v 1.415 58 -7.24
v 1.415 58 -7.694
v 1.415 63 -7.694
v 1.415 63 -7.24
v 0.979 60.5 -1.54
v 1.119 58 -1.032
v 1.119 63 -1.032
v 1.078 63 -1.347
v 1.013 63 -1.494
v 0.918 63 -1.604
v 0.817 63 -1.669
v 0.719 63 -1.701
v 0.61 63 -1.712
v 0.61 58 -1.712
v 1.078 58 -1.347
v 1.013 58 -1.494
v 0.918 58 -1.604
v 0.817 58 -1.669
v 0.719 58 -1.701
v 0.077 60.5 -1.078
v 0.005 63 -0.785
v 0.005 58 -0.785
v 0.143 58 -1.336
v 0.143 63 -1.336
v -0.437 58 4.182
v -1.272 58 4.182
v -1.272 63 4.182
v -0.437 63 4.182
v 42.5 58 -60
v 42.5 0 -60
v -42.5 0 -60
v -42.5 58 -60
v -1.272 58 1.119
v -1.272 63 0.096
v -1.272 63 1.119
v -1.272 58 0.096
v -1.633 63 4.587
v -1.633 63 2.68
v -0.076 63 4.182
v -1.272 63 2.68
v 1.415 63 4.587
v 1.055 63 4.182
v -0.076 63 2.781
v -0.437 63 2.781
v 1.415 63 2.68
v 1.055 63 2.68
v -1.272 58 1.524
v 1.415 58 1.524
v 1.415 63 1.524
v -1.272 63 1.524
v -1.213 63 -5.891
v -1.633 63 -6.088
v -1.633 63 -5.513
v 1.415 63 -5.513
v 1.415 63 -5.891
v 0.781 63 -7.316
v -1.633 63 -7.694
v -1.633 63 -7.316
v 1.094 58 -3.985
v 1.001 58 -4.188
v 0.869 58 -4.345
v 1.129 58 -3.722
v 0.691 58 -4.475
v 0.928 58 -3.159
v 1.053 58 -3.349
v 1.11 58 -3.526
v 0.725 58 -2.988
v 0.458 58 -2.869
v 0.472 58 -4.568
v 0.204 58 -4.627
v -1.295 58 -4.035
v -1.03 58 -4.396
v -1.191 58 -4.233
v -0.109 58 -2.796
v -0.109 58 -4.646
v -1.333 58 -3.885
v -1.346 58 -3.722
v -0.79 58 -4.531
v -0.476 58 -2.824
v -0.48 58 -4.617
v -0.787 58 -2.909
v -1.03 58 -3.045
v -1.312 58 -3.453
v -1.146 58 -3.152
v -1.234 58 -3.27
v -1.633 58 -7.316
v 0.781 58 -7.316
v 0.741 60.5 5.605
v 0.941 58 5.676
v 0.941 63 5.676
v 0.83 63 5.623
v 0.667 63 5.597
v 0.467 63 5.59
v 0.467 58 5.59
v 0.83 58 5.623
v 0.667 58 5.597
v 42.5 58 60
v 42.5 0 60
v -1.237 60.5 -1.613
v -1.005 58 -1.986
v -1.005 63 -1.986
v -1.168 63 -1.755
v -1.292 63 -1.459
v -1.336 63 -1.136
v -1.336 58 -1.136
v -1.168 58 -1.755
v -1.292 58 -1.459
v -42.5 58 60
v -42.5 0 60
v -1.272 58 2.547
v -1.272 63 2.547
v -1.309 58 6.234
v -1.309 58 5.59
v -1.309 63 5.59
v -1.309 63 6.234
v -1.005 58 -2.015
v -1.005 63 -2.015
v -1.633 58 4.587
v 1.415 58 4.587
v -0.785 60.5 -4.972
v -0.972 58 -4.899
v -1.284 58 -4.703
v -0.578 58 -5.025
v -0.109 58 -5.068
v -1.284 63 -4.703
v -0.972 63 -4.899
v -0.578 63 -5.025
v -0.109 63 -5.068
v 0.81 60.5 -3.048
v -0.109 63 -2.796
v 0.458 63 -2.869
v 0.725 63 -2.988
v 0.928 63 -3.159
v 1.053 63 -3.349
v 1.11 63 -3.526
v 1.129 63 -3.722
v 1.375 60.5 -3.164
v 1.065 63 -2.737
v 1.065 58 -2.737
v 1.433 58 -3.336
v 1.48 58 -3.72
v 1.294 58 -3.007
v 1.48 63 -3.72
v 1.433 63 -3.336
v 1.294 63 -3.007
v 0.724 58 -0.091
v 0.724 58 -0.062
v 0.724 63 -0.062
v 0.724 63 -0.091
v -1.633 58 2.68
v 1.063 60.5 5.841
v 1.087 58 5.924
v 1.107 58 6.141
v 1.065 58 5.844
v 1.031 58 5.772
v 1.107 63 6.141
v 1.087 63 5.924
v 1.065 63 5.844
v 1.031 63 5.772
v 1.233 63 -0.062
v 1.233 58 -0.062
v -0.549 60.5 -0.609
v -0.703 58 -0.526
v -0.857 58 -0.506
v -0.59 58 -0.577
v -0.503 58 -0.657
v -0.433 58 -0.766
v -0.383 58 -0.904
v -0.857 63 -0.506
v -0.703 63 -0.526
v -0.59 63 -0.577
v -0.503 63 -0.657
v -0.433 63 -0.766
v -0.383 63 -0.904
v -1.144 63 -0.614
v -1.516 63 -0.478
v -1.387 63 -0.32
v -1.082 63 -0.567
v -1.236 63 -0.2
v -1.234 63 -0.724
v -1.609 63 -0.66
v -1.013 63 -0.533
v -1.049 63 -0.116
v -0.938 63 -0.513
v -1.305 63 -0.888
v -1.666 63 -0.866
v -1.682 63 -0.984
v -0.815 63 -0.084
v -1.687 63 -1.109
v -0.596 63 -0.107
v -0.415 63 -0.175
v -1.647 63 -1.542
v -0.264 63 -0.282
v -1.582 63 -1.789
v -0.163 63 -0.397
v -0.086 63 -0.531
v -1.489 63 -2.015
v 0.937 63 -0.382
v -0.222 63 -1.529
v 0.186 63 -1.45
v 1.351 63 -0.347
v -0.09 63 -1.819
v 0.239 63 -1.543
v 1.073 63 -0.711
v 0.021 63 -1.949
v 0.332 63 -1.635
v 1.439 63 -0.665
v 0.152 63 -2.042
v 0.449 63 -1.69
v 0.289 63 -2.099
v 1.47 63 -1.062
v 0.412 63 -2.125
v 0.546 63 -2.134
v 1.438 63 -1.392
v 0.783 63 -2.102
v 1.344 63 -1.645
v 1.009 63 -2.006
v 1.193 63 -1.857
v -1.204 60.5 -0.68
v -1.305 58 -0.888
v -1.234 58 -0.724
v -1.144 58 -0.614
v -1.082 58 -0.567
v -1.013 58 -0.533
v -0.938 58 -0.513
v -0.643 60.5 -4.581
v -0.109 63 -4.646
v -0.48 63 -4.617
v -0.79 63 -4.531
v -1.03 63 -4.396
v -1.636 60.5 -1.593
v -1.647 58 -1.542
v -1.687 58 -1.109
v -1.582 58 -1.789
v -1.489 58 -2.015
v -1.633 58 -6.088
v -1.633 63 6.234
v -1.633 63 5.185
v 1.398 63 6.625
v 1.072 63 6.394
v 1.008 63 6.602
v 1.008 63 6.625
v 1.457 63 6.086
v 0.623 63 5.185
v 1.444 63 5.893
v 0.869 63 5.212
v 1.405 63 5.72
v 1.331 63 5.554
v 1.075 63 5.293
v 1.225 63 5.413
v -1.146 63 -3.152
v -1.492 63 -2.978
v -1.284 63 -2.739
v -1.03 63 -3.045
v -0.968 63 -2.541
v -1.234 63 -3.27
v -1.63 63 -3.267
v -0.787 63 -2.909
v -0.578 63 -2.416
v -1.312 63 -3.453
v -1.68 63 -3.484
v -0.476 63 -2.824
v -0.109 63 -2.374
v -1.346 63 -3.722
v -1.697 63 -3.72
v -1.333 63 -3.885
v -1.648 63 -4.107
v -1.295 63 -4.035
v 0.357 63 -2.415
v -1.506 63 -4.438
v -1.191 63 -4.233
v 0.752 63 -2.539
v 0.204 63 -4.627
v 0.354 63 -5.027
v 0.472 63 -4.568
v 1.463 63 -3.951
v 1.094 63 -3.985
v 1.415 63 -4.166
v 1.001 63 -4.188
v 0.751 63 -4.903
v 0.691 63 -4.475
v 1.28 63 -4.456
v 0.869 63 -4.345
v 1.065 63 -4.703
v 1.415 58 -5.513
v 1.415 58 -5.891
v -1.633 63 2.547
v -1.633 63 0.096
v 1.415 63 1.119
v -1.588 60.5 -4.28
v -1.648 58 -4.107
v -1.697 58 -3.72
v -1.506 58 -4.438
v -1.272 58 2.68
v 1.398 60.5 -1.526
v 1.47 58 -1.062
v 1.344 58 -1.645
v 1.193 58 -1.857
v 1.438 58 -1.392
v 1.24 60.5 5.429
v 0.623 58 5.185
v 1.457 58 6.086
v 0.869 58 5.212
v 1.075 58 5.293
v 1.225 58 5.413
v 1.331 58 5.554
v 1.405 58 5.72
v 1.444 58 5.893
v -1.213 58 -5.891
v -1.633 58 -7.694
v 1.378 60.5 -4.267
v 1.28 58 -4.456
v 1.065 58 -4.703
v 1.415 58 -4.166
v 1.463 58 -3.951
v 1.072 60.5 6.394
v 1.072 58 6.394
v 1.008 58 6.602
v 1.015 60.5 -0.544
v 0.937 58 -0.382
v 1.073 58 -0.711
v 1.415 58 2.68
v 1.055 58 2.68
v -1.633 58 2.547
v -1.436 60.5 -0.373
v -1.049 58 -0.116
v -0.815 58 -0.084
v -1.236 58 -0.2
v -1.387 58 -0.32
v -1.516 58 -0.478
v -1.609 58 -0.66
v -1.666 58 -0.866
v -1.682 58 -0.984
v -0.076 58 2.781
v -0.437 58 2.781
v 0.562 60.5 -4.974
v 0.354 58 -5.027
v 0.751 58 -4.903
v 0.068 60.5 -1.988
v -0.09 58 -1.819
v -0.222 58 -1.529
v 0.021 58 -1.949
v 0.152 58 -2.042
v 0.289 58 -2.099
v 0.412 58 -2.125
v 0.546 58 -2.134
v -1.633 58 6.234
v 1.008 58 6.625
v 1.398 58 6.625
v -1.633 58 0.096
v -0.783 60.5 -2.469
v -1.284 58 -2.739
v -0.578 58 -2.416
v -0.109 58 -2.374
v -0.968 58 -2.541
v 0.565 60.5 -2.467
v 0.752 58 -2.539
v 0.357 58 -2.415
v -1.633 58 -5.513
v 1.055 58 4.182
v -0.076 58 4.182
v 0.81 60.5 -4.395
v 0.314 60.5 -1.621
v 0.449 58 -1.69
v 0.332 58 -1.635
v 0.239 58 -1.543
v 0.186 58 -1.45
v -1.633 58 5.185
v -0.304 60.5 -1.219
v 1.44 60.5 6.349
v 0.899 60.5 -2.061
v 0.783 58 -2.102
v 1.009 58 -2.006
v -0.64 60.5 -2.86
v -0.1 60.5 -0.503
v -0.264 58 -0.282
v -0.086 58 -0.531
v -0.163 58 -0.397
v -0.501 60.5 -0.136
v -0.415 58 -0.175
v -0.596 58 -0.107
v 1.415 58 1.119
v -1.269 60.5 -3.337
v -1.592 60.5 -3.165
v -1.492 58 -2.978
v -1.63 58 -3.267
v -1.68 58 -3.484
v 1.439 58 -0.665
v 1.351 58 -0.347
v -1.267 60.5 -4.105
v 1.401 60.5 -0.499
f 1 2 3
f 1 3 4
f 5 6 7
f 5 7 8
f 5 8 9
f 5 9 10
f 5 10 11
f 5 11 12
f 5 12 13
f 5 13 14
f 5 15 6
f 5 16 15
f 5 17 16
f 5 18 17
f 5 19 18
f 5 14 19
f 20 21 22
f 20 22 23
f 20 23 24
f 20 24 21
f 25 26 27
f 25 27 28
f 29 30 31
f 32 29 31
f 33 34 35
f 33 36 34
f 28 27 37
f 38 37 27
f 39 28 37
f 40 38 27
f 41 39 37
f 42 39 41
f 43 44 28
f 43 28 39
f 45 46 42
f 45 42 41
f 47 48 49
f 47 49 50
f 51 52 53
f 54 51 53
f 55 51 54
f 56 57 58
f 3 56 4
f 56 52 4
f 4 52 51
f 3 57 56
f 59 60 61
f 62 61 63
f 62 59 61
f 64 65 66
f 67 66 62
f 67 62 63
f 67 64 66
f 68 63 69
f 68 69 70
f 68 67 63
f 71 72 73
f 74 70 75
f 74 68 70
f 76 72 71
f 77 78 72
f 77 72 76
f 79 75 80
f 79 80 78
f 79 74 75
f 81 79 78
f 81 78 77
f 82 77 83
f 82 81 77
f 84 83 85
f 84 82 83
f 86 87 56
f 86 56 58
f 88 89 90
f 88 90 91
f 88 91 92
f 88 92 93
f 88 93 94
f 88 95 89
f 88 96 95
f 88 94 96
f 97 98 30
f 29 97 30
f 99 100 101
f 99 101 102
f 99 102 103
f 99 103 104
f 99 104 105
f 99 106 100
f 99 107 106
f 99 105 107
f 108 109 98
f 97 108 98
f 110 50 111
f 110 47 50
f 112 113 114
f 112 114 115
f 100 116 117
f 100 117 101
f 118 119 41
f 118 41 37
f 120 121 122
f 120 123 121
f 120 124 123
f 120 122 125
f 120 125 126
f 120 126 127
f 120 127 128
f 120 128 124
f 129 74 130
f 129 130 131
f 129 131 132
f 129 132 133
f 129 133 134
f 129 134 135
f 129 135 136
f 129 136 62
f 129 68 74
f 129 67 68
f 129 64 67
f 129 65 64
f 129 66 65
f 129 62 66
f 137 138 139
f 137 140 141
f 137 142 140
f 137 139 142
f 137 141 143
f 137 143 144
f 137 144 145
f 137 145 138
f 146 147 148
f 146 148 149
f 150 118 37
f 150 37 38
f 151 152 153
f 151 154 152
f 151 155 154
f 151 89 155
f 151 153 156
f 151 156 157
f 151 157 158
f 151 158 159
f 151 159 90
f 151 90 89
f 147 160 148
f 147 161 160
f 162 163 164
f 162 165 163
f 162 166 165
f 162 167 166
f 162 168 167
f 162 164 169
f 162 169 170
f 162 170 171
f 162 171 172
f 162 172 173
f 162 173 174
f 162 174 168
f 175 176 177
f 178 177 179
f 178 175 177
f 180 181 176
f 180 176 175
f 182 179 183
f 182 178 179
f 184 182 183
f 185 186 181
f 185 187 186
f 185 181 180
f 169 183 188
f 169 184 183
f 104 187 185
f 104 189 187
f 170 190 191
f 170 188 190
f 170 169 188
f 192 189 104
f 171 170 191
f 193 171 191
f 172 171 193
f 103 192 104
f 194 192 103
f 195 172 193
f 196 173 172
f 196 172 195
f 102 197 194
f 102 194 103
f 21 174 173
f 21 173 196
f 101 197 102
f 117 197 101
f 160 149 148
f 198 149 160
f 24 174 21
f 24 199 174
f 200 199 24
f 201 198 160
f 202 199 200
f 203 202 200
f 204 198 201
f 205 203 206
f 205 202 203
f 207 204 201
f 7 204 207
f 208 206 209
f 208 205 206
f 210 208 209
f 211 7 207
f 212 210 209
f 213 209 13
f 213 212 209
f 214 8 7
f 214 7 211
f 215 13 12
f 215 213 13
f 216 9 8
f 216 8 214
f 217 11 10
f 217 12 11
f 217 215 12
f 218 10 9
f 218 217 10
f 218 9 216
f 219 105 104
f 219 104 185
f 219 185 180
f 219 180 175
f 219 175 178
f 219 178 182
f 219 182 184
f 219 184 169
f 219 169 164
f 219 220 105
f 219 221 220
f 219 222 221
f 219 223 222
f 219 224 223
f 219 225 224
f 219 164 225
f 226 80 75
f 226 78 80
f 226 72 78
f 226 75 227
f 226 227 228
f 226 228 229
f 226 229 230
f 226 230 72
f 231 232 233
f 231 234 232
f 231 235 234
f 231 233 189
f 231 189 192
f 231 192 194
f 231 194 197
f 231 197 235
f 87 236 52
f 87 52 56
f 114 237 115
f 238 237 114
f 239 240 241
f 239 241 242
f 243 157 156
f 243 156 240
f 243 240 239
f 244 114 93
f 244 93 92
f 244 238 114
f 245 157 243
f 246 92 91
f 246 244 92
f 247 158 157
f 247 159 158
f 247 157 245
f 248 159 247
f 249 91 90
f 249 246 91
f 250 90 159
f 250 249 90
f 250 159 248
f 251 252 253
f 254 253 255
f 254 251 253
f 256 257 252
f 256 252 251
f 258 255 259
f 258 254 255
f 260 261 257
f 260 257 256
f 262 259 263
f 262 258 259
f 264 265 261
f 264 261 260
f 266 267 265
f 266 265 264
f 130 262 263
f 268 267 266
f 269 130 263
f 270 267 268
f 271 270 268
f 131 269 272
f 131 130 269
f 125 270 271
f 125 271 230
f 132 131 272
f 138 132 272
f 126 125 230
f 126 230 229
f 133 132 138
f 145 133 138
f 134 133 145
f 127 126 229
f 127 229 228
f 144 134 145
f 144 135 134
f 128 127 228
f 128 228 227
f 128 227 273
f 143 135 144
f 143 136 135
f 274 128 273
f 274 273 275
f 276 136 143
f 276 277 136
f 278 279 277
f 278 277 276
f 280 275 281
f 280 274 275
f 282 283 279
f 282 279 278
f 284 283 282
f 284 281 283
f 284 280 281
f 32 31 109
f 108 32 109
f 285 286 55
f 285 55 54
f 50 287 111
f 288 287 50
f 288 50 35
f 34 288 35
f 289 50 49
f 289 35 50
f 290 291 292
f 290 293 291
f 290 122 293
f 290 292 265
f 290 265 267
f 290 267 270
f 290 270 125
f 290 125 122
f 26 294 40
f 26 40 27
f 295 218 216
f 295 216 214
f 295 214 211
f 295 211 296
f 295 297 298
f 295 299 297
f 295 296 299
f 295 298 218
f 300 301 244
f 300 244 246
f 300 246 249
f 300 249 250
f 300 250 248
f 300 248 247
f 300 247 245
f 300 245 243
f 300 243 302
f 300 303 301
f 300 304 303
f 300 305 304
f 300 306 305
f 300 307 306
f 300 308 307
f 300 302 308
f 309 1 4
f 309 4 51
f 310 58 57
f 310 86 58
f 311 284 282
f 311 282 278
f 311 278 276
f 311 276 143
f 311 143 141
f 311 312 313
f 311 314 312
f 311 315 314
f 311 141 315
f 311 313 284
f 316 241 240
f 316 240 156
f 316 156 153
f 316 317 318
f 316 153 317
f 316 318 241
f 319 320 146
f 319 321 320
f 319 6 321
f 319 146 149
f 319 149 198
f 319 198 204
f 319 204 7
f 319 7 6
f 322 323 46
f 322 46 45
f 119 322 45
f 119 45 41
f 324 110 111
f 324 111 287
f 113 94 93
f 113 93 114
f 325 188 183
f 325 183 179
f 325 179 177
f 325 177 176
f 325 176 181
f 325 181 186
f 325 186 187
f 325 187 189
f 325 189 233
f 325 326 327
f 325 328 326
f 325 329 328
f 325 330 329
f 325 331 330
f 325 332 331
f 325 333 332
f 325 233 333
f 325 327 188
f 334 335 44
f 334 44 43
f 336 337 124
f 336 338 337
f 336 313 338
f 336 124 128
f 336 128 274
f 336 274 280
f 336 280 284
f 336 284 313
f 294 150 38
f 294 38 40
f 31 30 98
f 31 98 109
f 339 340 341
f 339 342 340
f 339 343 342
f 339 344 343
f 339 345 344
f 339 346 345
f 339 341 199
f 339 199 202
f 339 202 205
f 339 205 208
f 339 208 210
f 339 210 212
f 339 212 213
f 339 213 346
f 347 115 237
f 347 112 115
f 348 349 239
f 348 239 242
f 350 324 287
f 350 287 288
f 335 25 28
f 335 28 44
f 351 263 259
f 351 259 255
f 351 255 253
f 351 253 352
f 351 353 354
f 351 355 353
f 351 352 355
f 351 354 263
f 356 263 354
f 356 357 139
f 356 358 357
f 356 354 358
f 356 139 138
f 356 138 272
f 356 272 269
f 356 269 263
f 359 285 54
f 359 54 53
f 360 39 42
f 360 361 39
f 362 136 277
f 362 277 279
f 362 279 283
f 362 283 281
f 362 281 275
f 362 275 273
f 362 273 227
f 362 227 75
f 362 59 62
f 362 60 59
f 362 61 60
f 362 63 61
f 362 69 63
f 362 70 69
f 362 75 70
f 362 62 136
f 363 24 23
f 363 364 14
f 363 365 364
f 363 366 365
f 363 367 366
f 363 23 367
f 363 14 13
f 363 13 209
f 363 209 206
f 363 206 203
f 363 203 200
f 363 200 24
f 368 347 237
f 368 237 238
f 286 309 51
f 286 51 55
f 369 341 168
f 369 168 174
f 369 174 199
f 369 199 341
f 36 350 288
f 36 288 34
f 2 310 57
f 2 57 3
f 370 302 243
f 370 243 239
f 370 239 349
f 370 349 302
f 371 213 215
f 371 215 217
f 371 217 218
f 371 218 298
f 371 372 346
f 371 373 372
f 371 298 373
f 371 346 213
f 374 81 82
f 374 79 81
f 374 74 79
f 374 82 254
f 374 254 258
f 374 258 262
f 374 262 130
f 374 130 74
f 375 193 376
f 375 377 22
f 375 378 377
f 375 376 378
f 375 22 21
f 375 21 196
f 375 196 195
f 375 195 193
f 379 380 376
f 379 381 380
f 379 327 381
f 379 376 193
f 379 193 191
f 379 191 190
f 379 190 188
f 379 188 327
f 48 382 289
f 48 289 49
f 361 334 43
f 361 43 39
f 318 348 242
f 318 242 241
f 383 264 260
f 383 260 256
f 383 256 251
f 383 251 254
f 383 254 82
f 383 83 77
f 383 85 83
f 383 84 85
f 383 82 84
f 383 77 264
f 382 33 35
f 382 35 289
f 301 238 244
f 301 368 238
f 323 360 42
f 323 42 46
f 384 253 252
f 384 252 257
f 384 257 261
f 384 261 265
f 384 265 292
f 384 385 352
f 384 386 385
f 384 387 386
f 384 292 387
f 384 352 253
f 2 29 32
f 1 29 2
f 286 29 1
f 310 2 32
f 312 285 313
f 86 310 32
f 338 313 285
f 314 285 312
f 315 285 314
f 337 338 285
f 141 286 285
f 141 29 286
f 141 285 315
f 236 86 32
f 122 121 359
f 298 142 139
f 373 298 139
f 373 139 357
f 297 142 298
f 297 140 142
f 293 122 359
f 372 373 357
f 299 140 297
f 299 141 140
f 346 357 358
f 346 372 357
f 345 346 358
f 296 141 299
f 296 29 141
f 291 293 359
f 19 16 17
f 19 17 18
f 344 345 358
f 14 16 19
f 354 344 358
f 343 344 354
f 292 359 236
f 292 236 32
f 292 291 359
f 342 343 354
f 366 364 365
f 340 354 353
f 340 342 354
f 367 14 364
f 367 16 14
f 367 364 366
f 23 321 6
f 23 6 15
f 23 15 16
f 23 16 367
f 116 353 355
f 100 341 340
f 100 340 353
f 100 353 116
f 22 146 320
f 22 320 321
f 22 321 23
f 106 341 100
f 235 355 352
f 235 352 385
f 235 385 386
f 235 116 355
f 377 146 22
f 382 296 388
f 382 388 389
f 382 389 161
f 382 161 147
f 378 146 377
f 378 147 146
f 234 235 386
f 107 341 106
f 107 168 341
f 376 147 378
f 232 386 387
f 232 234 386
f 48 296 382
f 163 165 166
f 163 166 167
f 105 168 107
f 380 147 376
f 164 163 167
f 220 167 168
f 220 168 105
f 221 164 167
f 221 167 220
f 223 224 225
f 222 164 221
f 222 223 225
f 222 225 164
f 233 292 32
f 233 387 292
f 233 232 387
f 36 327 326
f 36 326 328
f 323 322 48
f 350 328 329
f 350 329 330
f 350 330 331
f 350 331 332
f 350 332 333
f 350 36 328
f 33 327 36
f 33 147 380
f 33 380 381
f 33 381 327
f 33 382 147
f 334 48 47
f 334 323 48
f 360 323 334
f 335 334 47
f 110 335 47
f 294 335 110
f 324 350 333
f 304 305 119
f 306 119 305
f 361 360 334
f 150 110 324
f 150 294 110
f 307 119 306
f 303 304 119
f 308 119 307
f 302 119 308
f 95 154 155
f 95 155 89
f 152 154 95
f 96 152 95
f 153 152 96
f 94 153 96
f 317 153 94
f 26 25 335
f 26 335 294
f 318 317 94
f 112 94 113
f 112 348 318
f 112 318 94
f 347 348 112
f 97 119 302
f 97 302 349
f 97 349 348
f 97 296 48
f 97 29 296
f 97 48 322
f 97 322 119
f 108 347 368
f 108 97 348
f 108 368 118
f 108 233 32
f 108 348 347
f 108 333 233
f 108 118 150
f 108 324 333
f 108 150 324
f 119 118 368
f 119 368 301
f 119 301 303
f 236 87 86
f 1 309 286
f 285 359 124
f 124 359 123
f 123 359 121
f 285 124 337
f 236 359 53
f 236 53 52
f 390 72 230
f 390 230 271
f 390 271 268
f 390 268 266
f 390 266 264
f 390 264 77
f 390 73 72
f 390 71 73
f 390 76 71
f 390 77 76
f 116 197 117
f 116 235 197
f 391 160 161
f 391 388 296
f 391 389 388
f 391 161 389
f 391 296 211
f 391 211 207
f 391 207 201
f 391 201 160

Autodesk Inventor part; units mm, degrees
ref_plane "YZ Plane" through (0, 0, 0) normal (1, 0, 0) x (0, 1, 0)
ref_plane "XZ Plane" through (0, 0, 0) normal (0, 1, 0) x (-1, 0, 0)
ref_plane "XY Plane" through (0, 0, 0) normal (0, 0, 1) x (1, 0, 0)
sketch "Boceto1" plane through (0, 0, 0) normal (0, 1, 0) x (-1, 0, 0)
  line L0 (42.5, 60) -> (-42.5, 60)
  line L1 (-42.5, 60) -> (-42.5, -60)
  line L2 (-42.5, -60) -> (42.5, -60)
  line L3 (42.5, -60) -> (42.5, 60)
  line L4 (42.5, 60) -> (-42.5, -60) construction
  line L5 (-42.5, 60) -> (42.5, -60) construction
  point P0 (0, 0)
  dimension "d0" = 85
  dimension "d1" = 120
extrude "Extrusión1" add sketch "Boceto1" along normal blind 58
sketch "Boceto2" plane through (0, 58, 0) normal (0, 1, 0) x (1, 0, 0)
  line L0 (-1.6968, -6.642) -> (-1.6968, 31.3478) construction
  line L1 (-1.6968, 31.3478) -> (74.717, 31.3478) construction
  line L2 (74.717, 31.3478) -> (74.717, -6.642) construction
  line L3 (74.717, -6.642) -> (-1.6968, -6.642) construction
  spline S0 degree 2 poles (0.6226, -5.1847) (1.0227, -5.1847) (1.4574, -5.6738) (1.4574, -6.0862) knots 0 0 0 1 2 2 2
  spline S1 degree 2 poles (1.4574, -6.0862) (1.4574, -6.185) (1.4229, -6.5136) (1.3982, -6.6247) knots 0 0 0 1 2 2 2
  line L4 (1.3982, -6.6247) -> (1.0079, -6.6247)
  line L5 (1.0079, -6.6247) -> (1.0079, -6.6025)
  spline S2 degree 2 poles (1.0079, -6.6025) (1.0375, -6.5185) (1.1067, -6.269) (1.1067, -6.1406) knots 0 0 0 1 2 2 2
  spline S3 degree 2 poles (1.1067, -6.1406) (1.1067, -5.9529) (1.0202, -5.7281) (0.9412, -5.6762) knots 0 0 0 1 2 2 2
  spline S4 degree 2 poles (0.9412, -5.6762) (0.8597, -5.6194) (0.6226, -5.5898) (0.467, -5.5898) knots 0 0 0 1 2 2 2
  line L6 (0.467, -5.5898) -> (-1.309, -5.5898)
  line L7 (-1.309, -5.5898) -> (-1.309, -6.2344)
  line L8 (-1.309, -6.2344) -> (-1.6326, -6.2344)
  line L9 (-1.6326, -6.2344) -> (-1.6326, -5.1847)
  line L10 (-1.6326, -5.1847) -> (0.6226, -5.1847)
  line L11 (1.4154, -4.5869) -> (-1.6326, -4.5869)
  line L12 (-1.6326, -4.5869) -> (-1.6326, -2.6801)
  line L13 (-1.6326, -2.6801) -> (-1.2719, -2.6801)
  line L14 (-1.2719, -2.6801) -> (-1.2719, -4.1819)
  line L15 (-1.2719, -4.1819) -> (-0.4371, -4.1819)
  line L16 (-0.4371, -4.1819) -> (-0.4371, -2.7814)
  line L17 (-0.4371, -2.7814) -> (-0.0764, -2.7814)
  line L18 (-0.0764, -2.7814) -> (-0.0764, -4.1819)
  line L19 (-0.0764, -4.1819) -> (1.0548, -4.1819)
  line L20 (1.0548, -4.1819) -> (1.0548, -2.6801)
  line L21 (1.0548, -2.6801) -> (1.4154, -2.6801)
  line L22 (1.4154, -2.6801) -> (1.4154, -4.5869)
  line L23 (1.4154, -1.5241) -> (-1.2719, -1.5241)
  line L24 (-1.2719, -1.5241) -> (-1.2719, -2.5467)
  line L25 (-1.2719, -2.5467) -> (-1.6326, -2.5467)
  line L26 (-1.6326, -2.5467) -> (-1.6326, -0.0965)
  line L27 (-1.6326, -0.0965) -> (-1.2719, -0.0965)
  line L28 (-1.2719, -0.0965) -> (-1.2719, -1.119)
  line L29 (-1.2719, -1.119) -> (1.4154, -1.119)
  line L30 (1.4154, -1.119) -> (1.4154, -1.5241)
  spline S5 degree 2 poles (1.4698, 1.062) (1.4698, 0.731) (1.3315, 0.2666) (1.2327, 0.0616) knots 0 0 0 1 2 2 2
  line L31 (1.2327, 0.0616) -> (0.7238, 0.0616)
  line L32 (0.7238, 0.0616) -> (0.7238, 0.0913)
  spline S6 degree 2 poles (0.7238, 0.0913) (0.9116, 0.2913) (1.119, 0.7977) (1.119, 1.0323) knots 0 0 0 1 2 2 2
  spline S7 degree 2 poles (1.119, 1.0323) (1.119, 1.3683) (0.8399, 1.7116) (0.6102, 1.7116) knots 0 0 0 1 2 2 2
  spline S8 degree 2 poles (0.6102, 1.7116) (0.4274, 1.7116) (0.2002, 1.5313) (0.1434, 1.3361) knots 0 0 0 1 2 2 2
  spline S9 degree 2 poles (0.1434, 1.3361) (0.1039, 1.1954) (0.0495, 0.9607) (0.0051, 0.7853) knots 0 0 0 1 2 2 2
  spline S10 degree 2 poles (0.0051, 0.7853) (-0.0369, 0.6273) (-0.1629, 0.3778) (-0.2642, 0.2815) knots 0 0 0 1 2 2 2
  spline S11 degree 2 poles (-0.2642, 0.2815) (-0.3654, 0.1876) (-0.6371, 0.0839) (-0.815, 0.0839) knots 0 0 0 1 2 2 2
  spline S12 degree 2 poles (-0.815, 0.0839) (-1.1855, 0.0839) (-1.6869, 0.6618) (-1.6869, 1.1089) knots 0 0 0 1 2 2 2
  spline S13 degree 2 poles (-1.6869, 1.1089) (-1.6869, 1.3658) (-1.5856, 1.8203) (-1.4893, 2.0154) knots 0 0 0 1 2 2 2
  line L33 (-1.4893, 2.0154) -> (-1.0052, 2.0154)
  line L34 (-1.0052, 2.0154) -> (-1.0052, 1.9858)
  spline S14 degree 2 poles (-1.0052, 1.9858) (-1.1386, 1.84) (-1.3362, 1.3856) (-1.3362, 1.1361) knots 0 0 0 1 2 2 2
  spline S15 degree 2 poles (-1.3362, 1.1361) (-1.3362, 0.8545) (-1.0719, 0.5062) (-0.857, 0.5062) knots 0 0 0 1 2 2 2
  spline S16 degree 2 poles (-0.857, 0.5062) (-0.6643, 0.5062) (-0.4346, 0.7112) (-0.3827, 0.9039) knots 0 0 0 1 2 2 2
  spline S17 degree 2 poles (-0.3827, 0.9039) (-0.3481, 1.0323) (-0.2592, 1.4053) (-0.2222, 1.5288) knots 0 0 0 1 2 2 2
  spline S18 degree 2 poles (-0.2222, 1.5288) (-0.1258, 1.8425) (0.2619, 2.134) (0.546, 2.134) knots 0 0 0 1 2 2 2
  spline S19 degree 2 poles (0.546, 2.134) (0.7263, 2.134) (1.0721, 1.9882) (1.1931, 1.8573) knots 0 0 0 1 2 2 2
  spline S20 degree 2 poles (1.1931, 1.8573) (1.3265, 1.7116) (1.4698, 1.3411) (1.4698, 1.062) knots 0 0 0 1 2 2 2
  spline S21 degree 2 poles (-1.2843, 4.7028) (-1.0817, 4.8757) (-0.4889, 5.0683) (-0.1086, 5.0683) knots 0 0 0 1 2 2 2
  spline S22 degree 2 poles (-0.1086, 5.0683) (0.2619, 5.0683) (0.8622, 4.8806) (1.0647, 4.7028) knots 0 0 0 1 2 2 2
  spline S23 degree 2 poles (1.0647, 4.7028) (1.2771, 4.5151) (1.4797, 4.0186) (1.4797, 3.7197) knots 0 0 0 1 2 2 2
  spline S24 degree 2 poles (1.4797, 3.7197) (1.4797, 3.411) (1.2697, 2.917) (1.0647, 2.7366) knots 0 0 0 1 2 2 2
  spline S25 degree 2 poles (1.0647, 2.7366) (0.8622, 2.5613) (0.2669, 2.3736) (-0.1086, 2.3736) knots 0 0 0 1 2 2 2
  spline S26 degree 2 poles (-0.1086, 2.3736) (-0.4914, 2.3736) (-1.0743, 2.5637) (-1.2843, 2.7391) knots 0 0 0 1 2 2 2
  spline S27 degree 2 poles (-1.2843, 2.7391) (-1.4868, 2.917) (-1.6968, 3.4134) (-1.6968, 3.7197) knots 0 0 0 1 2 2 2
  spline S28 degree 2 poles (-1.6968, 3.7197) (-1.6968, 4.0309) (-1.4794, 4.5299) (-1.2843, 4.7028) knots 0 0 0 1 2 2 2
  spline S29 degree 2 poles (-0.1086, 4.646) (-0.4099, 4.646) (-0.8767, 4.5151) (-1.0299, 4.3965) knots 0 0 0 1 2 2 2
  spline S30 degree 2 poles (-1.0299, 4.3965) (-1.188, 4.2755) (-1.346, 3.9346) (-1.346, 3.7222) knots 0 0 0 1 2 2 2
  spline S31 degree 2 poles (-1.346, 3.7222) (-1.346, 3.5024) (-1.1929, 3.1714) (-1.0299, 3.0454) knots 0 0 0 1 2 2 2
  spline S32 degree 2 poles (-1.0299, 3.0454) (-0.8743, 2.9244) (-0.405, 2.7959) (-0.1086, 2.7959) knots 0 0 0 1 2 2 2
  spline S33 degree 2 poles (-0.1086, 2.7959) (0.4917, 2.7959) (1.1289, 3.2998) (1.1289, 3.7222) knots 0 0 0 1 2 2 2
  spline S34 degree 2 poles (1.1289, 3.7222) (1.1289, 4.1446) (0.4917, 4.646) (-0.1086, 4.646) knots 0 0 0 1 2 2 2
  line L35 (1.4154, 7.694) -> (1.4154, 7.2395)
  line L36 (1.4154, 7.2395) -> (-1.2127, 5.8909)
  line L37 (-1.2127, 5.8909) -> (1.4154, 5.8909)
  line L38 (1.4154, 5.8909) -> (1.4154, 5.5129)
  line L39 (1.4154, 5.5129) -> (-1.6326, 5.5129)
  line L40 (-1.6326, 5.5129) -> (-1.6326, 6.0885)
  line L41 (-1.6326, 6.0885) -> (0.7807, 7.3161)
  line L42 (0.7807, 7.3161) -> (-1.6326, 7.3161)
  line L43 (-1.6326, 7.3161) -> (-1.6326, 7.694)
  line L44 (-1.6326, 7.694) -> (1.4154, 7.694)
  point P0 (0, 0)
extrude "Extrusión2" add sketch "Boceto2" along normal blind 5
properties part number "jetson"
